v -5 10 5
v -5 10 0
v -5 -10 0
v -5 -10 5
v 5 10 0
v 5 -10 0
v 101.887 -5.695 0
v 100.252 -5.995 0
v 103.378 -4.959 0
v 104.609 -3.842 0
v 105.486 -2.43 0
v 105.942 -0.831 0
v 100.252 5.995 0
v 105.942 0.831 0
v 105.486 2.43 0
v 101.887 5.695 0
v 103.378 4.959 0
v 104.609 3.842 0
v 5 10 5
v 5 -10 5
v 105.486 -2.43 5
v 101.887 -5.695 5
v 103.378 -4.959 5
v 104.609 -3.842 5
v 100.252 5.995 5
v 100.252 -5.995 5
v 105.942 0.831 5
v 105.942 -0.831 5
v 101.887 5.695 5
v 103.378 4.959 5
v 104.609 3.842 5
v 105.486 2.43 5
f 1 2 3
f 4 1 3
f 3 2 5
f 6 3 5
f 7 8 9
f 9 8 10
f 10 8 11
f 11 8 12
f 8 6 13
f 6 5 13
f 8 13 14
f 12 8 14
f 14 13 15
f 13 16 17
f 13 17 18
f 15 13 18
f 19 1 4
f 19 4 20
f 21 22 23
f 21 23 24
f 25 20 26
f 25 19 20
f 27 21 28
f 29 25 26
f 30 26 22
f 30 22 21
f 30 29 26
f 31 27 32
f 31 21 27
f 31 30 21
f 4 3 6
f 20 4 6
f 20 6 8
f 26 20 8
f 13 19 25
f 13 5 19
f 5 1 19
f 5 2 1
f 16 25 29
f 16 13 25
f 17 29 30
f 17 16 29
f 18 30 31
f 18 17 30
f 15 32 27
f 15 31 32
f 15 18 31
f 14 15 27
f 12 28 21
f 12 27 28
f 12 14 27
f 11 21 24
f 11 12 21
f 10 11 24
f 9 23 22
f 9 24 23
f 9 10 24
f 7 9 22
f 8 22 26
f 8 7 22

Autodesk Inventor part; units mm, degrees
ref_plane "YZ Plane" through (0, 0, 0) normal (1, 0, 0) x (0, 1, 0)
ref_plane "XZ Plane" through (0, 0, 0) normal (0, 1, 0) x (-1, 0, 0)
ref_plane "XY Plane" through (0, 0, 0) normal (0, 0, 1) x (1, 0, 0)
sketch "スケッチ1" plane through (0, 0, 0) normal (0, 0, 1) x (1, 0, 0)
  circle A0 centre (0, 5) radius 1.55
  circle A1 centre (0, -5) radius 1.55
  line L0 (0, 5) -> (0, -5) construction
  line L1 (0, 0) -> (100, 0) construction
  circle A2 centre (100, 0) radius 1.55
  line L2 (-5, 10) -> (-5, -10)
  line L3 (-5, -10) -> (5, -10)
  line L4 (5, -10) -> (100.2521, -5.9947)
  line L5 (-5, 10) -> (5, 10)
  line L6 (5, 10) -> (100.2521, 5.9947)
  arc A3 (100.2521, -5.9947) -> (100.2521, 5.9947) centre (100, 0) ccw
  circle A4 centre (0, 5) radius 3 construction
  circle A5 centre (0, 5) radius 5 construction
  line L7 (5, 10) -> (5, -10) construction
  point P0 (-5, 0)
  dimension "d0" = 10
  dimension "d1" = 3.1
  dimension "d2" = 3.1
  dimension "d3" = 100
  dimension "d4" = 6
  dimension "d5" = 6
  dimension "d6" = 2
extrude "押し出し1" add sketch "スケッチ1" along normal blind 5
sketch "スケッチ5" plane through (0, 0, 5) normal (0, 0, 1) x (1, 0, 0)
  circle A0 centre (100, 0) radius 1.55 projected
  circle A1 centre (100, 0) radius 1.55
  circle A2 centre (0, -5) radius 1.55 projected
  circle A3 centre (0, -5) radius 1.55
  circle A4 centre (0, 5) radius 1.55 projected
  circle A5 centre (0, 5) radius 1.55
  point P0 (0, 0)
extrude "押し出し5" add sketch "スケッチ5" against normal up to surface (5 mm away)
properties part number "胴体_サブフレーム_1_12" material "アセタール樹脂、黒"
